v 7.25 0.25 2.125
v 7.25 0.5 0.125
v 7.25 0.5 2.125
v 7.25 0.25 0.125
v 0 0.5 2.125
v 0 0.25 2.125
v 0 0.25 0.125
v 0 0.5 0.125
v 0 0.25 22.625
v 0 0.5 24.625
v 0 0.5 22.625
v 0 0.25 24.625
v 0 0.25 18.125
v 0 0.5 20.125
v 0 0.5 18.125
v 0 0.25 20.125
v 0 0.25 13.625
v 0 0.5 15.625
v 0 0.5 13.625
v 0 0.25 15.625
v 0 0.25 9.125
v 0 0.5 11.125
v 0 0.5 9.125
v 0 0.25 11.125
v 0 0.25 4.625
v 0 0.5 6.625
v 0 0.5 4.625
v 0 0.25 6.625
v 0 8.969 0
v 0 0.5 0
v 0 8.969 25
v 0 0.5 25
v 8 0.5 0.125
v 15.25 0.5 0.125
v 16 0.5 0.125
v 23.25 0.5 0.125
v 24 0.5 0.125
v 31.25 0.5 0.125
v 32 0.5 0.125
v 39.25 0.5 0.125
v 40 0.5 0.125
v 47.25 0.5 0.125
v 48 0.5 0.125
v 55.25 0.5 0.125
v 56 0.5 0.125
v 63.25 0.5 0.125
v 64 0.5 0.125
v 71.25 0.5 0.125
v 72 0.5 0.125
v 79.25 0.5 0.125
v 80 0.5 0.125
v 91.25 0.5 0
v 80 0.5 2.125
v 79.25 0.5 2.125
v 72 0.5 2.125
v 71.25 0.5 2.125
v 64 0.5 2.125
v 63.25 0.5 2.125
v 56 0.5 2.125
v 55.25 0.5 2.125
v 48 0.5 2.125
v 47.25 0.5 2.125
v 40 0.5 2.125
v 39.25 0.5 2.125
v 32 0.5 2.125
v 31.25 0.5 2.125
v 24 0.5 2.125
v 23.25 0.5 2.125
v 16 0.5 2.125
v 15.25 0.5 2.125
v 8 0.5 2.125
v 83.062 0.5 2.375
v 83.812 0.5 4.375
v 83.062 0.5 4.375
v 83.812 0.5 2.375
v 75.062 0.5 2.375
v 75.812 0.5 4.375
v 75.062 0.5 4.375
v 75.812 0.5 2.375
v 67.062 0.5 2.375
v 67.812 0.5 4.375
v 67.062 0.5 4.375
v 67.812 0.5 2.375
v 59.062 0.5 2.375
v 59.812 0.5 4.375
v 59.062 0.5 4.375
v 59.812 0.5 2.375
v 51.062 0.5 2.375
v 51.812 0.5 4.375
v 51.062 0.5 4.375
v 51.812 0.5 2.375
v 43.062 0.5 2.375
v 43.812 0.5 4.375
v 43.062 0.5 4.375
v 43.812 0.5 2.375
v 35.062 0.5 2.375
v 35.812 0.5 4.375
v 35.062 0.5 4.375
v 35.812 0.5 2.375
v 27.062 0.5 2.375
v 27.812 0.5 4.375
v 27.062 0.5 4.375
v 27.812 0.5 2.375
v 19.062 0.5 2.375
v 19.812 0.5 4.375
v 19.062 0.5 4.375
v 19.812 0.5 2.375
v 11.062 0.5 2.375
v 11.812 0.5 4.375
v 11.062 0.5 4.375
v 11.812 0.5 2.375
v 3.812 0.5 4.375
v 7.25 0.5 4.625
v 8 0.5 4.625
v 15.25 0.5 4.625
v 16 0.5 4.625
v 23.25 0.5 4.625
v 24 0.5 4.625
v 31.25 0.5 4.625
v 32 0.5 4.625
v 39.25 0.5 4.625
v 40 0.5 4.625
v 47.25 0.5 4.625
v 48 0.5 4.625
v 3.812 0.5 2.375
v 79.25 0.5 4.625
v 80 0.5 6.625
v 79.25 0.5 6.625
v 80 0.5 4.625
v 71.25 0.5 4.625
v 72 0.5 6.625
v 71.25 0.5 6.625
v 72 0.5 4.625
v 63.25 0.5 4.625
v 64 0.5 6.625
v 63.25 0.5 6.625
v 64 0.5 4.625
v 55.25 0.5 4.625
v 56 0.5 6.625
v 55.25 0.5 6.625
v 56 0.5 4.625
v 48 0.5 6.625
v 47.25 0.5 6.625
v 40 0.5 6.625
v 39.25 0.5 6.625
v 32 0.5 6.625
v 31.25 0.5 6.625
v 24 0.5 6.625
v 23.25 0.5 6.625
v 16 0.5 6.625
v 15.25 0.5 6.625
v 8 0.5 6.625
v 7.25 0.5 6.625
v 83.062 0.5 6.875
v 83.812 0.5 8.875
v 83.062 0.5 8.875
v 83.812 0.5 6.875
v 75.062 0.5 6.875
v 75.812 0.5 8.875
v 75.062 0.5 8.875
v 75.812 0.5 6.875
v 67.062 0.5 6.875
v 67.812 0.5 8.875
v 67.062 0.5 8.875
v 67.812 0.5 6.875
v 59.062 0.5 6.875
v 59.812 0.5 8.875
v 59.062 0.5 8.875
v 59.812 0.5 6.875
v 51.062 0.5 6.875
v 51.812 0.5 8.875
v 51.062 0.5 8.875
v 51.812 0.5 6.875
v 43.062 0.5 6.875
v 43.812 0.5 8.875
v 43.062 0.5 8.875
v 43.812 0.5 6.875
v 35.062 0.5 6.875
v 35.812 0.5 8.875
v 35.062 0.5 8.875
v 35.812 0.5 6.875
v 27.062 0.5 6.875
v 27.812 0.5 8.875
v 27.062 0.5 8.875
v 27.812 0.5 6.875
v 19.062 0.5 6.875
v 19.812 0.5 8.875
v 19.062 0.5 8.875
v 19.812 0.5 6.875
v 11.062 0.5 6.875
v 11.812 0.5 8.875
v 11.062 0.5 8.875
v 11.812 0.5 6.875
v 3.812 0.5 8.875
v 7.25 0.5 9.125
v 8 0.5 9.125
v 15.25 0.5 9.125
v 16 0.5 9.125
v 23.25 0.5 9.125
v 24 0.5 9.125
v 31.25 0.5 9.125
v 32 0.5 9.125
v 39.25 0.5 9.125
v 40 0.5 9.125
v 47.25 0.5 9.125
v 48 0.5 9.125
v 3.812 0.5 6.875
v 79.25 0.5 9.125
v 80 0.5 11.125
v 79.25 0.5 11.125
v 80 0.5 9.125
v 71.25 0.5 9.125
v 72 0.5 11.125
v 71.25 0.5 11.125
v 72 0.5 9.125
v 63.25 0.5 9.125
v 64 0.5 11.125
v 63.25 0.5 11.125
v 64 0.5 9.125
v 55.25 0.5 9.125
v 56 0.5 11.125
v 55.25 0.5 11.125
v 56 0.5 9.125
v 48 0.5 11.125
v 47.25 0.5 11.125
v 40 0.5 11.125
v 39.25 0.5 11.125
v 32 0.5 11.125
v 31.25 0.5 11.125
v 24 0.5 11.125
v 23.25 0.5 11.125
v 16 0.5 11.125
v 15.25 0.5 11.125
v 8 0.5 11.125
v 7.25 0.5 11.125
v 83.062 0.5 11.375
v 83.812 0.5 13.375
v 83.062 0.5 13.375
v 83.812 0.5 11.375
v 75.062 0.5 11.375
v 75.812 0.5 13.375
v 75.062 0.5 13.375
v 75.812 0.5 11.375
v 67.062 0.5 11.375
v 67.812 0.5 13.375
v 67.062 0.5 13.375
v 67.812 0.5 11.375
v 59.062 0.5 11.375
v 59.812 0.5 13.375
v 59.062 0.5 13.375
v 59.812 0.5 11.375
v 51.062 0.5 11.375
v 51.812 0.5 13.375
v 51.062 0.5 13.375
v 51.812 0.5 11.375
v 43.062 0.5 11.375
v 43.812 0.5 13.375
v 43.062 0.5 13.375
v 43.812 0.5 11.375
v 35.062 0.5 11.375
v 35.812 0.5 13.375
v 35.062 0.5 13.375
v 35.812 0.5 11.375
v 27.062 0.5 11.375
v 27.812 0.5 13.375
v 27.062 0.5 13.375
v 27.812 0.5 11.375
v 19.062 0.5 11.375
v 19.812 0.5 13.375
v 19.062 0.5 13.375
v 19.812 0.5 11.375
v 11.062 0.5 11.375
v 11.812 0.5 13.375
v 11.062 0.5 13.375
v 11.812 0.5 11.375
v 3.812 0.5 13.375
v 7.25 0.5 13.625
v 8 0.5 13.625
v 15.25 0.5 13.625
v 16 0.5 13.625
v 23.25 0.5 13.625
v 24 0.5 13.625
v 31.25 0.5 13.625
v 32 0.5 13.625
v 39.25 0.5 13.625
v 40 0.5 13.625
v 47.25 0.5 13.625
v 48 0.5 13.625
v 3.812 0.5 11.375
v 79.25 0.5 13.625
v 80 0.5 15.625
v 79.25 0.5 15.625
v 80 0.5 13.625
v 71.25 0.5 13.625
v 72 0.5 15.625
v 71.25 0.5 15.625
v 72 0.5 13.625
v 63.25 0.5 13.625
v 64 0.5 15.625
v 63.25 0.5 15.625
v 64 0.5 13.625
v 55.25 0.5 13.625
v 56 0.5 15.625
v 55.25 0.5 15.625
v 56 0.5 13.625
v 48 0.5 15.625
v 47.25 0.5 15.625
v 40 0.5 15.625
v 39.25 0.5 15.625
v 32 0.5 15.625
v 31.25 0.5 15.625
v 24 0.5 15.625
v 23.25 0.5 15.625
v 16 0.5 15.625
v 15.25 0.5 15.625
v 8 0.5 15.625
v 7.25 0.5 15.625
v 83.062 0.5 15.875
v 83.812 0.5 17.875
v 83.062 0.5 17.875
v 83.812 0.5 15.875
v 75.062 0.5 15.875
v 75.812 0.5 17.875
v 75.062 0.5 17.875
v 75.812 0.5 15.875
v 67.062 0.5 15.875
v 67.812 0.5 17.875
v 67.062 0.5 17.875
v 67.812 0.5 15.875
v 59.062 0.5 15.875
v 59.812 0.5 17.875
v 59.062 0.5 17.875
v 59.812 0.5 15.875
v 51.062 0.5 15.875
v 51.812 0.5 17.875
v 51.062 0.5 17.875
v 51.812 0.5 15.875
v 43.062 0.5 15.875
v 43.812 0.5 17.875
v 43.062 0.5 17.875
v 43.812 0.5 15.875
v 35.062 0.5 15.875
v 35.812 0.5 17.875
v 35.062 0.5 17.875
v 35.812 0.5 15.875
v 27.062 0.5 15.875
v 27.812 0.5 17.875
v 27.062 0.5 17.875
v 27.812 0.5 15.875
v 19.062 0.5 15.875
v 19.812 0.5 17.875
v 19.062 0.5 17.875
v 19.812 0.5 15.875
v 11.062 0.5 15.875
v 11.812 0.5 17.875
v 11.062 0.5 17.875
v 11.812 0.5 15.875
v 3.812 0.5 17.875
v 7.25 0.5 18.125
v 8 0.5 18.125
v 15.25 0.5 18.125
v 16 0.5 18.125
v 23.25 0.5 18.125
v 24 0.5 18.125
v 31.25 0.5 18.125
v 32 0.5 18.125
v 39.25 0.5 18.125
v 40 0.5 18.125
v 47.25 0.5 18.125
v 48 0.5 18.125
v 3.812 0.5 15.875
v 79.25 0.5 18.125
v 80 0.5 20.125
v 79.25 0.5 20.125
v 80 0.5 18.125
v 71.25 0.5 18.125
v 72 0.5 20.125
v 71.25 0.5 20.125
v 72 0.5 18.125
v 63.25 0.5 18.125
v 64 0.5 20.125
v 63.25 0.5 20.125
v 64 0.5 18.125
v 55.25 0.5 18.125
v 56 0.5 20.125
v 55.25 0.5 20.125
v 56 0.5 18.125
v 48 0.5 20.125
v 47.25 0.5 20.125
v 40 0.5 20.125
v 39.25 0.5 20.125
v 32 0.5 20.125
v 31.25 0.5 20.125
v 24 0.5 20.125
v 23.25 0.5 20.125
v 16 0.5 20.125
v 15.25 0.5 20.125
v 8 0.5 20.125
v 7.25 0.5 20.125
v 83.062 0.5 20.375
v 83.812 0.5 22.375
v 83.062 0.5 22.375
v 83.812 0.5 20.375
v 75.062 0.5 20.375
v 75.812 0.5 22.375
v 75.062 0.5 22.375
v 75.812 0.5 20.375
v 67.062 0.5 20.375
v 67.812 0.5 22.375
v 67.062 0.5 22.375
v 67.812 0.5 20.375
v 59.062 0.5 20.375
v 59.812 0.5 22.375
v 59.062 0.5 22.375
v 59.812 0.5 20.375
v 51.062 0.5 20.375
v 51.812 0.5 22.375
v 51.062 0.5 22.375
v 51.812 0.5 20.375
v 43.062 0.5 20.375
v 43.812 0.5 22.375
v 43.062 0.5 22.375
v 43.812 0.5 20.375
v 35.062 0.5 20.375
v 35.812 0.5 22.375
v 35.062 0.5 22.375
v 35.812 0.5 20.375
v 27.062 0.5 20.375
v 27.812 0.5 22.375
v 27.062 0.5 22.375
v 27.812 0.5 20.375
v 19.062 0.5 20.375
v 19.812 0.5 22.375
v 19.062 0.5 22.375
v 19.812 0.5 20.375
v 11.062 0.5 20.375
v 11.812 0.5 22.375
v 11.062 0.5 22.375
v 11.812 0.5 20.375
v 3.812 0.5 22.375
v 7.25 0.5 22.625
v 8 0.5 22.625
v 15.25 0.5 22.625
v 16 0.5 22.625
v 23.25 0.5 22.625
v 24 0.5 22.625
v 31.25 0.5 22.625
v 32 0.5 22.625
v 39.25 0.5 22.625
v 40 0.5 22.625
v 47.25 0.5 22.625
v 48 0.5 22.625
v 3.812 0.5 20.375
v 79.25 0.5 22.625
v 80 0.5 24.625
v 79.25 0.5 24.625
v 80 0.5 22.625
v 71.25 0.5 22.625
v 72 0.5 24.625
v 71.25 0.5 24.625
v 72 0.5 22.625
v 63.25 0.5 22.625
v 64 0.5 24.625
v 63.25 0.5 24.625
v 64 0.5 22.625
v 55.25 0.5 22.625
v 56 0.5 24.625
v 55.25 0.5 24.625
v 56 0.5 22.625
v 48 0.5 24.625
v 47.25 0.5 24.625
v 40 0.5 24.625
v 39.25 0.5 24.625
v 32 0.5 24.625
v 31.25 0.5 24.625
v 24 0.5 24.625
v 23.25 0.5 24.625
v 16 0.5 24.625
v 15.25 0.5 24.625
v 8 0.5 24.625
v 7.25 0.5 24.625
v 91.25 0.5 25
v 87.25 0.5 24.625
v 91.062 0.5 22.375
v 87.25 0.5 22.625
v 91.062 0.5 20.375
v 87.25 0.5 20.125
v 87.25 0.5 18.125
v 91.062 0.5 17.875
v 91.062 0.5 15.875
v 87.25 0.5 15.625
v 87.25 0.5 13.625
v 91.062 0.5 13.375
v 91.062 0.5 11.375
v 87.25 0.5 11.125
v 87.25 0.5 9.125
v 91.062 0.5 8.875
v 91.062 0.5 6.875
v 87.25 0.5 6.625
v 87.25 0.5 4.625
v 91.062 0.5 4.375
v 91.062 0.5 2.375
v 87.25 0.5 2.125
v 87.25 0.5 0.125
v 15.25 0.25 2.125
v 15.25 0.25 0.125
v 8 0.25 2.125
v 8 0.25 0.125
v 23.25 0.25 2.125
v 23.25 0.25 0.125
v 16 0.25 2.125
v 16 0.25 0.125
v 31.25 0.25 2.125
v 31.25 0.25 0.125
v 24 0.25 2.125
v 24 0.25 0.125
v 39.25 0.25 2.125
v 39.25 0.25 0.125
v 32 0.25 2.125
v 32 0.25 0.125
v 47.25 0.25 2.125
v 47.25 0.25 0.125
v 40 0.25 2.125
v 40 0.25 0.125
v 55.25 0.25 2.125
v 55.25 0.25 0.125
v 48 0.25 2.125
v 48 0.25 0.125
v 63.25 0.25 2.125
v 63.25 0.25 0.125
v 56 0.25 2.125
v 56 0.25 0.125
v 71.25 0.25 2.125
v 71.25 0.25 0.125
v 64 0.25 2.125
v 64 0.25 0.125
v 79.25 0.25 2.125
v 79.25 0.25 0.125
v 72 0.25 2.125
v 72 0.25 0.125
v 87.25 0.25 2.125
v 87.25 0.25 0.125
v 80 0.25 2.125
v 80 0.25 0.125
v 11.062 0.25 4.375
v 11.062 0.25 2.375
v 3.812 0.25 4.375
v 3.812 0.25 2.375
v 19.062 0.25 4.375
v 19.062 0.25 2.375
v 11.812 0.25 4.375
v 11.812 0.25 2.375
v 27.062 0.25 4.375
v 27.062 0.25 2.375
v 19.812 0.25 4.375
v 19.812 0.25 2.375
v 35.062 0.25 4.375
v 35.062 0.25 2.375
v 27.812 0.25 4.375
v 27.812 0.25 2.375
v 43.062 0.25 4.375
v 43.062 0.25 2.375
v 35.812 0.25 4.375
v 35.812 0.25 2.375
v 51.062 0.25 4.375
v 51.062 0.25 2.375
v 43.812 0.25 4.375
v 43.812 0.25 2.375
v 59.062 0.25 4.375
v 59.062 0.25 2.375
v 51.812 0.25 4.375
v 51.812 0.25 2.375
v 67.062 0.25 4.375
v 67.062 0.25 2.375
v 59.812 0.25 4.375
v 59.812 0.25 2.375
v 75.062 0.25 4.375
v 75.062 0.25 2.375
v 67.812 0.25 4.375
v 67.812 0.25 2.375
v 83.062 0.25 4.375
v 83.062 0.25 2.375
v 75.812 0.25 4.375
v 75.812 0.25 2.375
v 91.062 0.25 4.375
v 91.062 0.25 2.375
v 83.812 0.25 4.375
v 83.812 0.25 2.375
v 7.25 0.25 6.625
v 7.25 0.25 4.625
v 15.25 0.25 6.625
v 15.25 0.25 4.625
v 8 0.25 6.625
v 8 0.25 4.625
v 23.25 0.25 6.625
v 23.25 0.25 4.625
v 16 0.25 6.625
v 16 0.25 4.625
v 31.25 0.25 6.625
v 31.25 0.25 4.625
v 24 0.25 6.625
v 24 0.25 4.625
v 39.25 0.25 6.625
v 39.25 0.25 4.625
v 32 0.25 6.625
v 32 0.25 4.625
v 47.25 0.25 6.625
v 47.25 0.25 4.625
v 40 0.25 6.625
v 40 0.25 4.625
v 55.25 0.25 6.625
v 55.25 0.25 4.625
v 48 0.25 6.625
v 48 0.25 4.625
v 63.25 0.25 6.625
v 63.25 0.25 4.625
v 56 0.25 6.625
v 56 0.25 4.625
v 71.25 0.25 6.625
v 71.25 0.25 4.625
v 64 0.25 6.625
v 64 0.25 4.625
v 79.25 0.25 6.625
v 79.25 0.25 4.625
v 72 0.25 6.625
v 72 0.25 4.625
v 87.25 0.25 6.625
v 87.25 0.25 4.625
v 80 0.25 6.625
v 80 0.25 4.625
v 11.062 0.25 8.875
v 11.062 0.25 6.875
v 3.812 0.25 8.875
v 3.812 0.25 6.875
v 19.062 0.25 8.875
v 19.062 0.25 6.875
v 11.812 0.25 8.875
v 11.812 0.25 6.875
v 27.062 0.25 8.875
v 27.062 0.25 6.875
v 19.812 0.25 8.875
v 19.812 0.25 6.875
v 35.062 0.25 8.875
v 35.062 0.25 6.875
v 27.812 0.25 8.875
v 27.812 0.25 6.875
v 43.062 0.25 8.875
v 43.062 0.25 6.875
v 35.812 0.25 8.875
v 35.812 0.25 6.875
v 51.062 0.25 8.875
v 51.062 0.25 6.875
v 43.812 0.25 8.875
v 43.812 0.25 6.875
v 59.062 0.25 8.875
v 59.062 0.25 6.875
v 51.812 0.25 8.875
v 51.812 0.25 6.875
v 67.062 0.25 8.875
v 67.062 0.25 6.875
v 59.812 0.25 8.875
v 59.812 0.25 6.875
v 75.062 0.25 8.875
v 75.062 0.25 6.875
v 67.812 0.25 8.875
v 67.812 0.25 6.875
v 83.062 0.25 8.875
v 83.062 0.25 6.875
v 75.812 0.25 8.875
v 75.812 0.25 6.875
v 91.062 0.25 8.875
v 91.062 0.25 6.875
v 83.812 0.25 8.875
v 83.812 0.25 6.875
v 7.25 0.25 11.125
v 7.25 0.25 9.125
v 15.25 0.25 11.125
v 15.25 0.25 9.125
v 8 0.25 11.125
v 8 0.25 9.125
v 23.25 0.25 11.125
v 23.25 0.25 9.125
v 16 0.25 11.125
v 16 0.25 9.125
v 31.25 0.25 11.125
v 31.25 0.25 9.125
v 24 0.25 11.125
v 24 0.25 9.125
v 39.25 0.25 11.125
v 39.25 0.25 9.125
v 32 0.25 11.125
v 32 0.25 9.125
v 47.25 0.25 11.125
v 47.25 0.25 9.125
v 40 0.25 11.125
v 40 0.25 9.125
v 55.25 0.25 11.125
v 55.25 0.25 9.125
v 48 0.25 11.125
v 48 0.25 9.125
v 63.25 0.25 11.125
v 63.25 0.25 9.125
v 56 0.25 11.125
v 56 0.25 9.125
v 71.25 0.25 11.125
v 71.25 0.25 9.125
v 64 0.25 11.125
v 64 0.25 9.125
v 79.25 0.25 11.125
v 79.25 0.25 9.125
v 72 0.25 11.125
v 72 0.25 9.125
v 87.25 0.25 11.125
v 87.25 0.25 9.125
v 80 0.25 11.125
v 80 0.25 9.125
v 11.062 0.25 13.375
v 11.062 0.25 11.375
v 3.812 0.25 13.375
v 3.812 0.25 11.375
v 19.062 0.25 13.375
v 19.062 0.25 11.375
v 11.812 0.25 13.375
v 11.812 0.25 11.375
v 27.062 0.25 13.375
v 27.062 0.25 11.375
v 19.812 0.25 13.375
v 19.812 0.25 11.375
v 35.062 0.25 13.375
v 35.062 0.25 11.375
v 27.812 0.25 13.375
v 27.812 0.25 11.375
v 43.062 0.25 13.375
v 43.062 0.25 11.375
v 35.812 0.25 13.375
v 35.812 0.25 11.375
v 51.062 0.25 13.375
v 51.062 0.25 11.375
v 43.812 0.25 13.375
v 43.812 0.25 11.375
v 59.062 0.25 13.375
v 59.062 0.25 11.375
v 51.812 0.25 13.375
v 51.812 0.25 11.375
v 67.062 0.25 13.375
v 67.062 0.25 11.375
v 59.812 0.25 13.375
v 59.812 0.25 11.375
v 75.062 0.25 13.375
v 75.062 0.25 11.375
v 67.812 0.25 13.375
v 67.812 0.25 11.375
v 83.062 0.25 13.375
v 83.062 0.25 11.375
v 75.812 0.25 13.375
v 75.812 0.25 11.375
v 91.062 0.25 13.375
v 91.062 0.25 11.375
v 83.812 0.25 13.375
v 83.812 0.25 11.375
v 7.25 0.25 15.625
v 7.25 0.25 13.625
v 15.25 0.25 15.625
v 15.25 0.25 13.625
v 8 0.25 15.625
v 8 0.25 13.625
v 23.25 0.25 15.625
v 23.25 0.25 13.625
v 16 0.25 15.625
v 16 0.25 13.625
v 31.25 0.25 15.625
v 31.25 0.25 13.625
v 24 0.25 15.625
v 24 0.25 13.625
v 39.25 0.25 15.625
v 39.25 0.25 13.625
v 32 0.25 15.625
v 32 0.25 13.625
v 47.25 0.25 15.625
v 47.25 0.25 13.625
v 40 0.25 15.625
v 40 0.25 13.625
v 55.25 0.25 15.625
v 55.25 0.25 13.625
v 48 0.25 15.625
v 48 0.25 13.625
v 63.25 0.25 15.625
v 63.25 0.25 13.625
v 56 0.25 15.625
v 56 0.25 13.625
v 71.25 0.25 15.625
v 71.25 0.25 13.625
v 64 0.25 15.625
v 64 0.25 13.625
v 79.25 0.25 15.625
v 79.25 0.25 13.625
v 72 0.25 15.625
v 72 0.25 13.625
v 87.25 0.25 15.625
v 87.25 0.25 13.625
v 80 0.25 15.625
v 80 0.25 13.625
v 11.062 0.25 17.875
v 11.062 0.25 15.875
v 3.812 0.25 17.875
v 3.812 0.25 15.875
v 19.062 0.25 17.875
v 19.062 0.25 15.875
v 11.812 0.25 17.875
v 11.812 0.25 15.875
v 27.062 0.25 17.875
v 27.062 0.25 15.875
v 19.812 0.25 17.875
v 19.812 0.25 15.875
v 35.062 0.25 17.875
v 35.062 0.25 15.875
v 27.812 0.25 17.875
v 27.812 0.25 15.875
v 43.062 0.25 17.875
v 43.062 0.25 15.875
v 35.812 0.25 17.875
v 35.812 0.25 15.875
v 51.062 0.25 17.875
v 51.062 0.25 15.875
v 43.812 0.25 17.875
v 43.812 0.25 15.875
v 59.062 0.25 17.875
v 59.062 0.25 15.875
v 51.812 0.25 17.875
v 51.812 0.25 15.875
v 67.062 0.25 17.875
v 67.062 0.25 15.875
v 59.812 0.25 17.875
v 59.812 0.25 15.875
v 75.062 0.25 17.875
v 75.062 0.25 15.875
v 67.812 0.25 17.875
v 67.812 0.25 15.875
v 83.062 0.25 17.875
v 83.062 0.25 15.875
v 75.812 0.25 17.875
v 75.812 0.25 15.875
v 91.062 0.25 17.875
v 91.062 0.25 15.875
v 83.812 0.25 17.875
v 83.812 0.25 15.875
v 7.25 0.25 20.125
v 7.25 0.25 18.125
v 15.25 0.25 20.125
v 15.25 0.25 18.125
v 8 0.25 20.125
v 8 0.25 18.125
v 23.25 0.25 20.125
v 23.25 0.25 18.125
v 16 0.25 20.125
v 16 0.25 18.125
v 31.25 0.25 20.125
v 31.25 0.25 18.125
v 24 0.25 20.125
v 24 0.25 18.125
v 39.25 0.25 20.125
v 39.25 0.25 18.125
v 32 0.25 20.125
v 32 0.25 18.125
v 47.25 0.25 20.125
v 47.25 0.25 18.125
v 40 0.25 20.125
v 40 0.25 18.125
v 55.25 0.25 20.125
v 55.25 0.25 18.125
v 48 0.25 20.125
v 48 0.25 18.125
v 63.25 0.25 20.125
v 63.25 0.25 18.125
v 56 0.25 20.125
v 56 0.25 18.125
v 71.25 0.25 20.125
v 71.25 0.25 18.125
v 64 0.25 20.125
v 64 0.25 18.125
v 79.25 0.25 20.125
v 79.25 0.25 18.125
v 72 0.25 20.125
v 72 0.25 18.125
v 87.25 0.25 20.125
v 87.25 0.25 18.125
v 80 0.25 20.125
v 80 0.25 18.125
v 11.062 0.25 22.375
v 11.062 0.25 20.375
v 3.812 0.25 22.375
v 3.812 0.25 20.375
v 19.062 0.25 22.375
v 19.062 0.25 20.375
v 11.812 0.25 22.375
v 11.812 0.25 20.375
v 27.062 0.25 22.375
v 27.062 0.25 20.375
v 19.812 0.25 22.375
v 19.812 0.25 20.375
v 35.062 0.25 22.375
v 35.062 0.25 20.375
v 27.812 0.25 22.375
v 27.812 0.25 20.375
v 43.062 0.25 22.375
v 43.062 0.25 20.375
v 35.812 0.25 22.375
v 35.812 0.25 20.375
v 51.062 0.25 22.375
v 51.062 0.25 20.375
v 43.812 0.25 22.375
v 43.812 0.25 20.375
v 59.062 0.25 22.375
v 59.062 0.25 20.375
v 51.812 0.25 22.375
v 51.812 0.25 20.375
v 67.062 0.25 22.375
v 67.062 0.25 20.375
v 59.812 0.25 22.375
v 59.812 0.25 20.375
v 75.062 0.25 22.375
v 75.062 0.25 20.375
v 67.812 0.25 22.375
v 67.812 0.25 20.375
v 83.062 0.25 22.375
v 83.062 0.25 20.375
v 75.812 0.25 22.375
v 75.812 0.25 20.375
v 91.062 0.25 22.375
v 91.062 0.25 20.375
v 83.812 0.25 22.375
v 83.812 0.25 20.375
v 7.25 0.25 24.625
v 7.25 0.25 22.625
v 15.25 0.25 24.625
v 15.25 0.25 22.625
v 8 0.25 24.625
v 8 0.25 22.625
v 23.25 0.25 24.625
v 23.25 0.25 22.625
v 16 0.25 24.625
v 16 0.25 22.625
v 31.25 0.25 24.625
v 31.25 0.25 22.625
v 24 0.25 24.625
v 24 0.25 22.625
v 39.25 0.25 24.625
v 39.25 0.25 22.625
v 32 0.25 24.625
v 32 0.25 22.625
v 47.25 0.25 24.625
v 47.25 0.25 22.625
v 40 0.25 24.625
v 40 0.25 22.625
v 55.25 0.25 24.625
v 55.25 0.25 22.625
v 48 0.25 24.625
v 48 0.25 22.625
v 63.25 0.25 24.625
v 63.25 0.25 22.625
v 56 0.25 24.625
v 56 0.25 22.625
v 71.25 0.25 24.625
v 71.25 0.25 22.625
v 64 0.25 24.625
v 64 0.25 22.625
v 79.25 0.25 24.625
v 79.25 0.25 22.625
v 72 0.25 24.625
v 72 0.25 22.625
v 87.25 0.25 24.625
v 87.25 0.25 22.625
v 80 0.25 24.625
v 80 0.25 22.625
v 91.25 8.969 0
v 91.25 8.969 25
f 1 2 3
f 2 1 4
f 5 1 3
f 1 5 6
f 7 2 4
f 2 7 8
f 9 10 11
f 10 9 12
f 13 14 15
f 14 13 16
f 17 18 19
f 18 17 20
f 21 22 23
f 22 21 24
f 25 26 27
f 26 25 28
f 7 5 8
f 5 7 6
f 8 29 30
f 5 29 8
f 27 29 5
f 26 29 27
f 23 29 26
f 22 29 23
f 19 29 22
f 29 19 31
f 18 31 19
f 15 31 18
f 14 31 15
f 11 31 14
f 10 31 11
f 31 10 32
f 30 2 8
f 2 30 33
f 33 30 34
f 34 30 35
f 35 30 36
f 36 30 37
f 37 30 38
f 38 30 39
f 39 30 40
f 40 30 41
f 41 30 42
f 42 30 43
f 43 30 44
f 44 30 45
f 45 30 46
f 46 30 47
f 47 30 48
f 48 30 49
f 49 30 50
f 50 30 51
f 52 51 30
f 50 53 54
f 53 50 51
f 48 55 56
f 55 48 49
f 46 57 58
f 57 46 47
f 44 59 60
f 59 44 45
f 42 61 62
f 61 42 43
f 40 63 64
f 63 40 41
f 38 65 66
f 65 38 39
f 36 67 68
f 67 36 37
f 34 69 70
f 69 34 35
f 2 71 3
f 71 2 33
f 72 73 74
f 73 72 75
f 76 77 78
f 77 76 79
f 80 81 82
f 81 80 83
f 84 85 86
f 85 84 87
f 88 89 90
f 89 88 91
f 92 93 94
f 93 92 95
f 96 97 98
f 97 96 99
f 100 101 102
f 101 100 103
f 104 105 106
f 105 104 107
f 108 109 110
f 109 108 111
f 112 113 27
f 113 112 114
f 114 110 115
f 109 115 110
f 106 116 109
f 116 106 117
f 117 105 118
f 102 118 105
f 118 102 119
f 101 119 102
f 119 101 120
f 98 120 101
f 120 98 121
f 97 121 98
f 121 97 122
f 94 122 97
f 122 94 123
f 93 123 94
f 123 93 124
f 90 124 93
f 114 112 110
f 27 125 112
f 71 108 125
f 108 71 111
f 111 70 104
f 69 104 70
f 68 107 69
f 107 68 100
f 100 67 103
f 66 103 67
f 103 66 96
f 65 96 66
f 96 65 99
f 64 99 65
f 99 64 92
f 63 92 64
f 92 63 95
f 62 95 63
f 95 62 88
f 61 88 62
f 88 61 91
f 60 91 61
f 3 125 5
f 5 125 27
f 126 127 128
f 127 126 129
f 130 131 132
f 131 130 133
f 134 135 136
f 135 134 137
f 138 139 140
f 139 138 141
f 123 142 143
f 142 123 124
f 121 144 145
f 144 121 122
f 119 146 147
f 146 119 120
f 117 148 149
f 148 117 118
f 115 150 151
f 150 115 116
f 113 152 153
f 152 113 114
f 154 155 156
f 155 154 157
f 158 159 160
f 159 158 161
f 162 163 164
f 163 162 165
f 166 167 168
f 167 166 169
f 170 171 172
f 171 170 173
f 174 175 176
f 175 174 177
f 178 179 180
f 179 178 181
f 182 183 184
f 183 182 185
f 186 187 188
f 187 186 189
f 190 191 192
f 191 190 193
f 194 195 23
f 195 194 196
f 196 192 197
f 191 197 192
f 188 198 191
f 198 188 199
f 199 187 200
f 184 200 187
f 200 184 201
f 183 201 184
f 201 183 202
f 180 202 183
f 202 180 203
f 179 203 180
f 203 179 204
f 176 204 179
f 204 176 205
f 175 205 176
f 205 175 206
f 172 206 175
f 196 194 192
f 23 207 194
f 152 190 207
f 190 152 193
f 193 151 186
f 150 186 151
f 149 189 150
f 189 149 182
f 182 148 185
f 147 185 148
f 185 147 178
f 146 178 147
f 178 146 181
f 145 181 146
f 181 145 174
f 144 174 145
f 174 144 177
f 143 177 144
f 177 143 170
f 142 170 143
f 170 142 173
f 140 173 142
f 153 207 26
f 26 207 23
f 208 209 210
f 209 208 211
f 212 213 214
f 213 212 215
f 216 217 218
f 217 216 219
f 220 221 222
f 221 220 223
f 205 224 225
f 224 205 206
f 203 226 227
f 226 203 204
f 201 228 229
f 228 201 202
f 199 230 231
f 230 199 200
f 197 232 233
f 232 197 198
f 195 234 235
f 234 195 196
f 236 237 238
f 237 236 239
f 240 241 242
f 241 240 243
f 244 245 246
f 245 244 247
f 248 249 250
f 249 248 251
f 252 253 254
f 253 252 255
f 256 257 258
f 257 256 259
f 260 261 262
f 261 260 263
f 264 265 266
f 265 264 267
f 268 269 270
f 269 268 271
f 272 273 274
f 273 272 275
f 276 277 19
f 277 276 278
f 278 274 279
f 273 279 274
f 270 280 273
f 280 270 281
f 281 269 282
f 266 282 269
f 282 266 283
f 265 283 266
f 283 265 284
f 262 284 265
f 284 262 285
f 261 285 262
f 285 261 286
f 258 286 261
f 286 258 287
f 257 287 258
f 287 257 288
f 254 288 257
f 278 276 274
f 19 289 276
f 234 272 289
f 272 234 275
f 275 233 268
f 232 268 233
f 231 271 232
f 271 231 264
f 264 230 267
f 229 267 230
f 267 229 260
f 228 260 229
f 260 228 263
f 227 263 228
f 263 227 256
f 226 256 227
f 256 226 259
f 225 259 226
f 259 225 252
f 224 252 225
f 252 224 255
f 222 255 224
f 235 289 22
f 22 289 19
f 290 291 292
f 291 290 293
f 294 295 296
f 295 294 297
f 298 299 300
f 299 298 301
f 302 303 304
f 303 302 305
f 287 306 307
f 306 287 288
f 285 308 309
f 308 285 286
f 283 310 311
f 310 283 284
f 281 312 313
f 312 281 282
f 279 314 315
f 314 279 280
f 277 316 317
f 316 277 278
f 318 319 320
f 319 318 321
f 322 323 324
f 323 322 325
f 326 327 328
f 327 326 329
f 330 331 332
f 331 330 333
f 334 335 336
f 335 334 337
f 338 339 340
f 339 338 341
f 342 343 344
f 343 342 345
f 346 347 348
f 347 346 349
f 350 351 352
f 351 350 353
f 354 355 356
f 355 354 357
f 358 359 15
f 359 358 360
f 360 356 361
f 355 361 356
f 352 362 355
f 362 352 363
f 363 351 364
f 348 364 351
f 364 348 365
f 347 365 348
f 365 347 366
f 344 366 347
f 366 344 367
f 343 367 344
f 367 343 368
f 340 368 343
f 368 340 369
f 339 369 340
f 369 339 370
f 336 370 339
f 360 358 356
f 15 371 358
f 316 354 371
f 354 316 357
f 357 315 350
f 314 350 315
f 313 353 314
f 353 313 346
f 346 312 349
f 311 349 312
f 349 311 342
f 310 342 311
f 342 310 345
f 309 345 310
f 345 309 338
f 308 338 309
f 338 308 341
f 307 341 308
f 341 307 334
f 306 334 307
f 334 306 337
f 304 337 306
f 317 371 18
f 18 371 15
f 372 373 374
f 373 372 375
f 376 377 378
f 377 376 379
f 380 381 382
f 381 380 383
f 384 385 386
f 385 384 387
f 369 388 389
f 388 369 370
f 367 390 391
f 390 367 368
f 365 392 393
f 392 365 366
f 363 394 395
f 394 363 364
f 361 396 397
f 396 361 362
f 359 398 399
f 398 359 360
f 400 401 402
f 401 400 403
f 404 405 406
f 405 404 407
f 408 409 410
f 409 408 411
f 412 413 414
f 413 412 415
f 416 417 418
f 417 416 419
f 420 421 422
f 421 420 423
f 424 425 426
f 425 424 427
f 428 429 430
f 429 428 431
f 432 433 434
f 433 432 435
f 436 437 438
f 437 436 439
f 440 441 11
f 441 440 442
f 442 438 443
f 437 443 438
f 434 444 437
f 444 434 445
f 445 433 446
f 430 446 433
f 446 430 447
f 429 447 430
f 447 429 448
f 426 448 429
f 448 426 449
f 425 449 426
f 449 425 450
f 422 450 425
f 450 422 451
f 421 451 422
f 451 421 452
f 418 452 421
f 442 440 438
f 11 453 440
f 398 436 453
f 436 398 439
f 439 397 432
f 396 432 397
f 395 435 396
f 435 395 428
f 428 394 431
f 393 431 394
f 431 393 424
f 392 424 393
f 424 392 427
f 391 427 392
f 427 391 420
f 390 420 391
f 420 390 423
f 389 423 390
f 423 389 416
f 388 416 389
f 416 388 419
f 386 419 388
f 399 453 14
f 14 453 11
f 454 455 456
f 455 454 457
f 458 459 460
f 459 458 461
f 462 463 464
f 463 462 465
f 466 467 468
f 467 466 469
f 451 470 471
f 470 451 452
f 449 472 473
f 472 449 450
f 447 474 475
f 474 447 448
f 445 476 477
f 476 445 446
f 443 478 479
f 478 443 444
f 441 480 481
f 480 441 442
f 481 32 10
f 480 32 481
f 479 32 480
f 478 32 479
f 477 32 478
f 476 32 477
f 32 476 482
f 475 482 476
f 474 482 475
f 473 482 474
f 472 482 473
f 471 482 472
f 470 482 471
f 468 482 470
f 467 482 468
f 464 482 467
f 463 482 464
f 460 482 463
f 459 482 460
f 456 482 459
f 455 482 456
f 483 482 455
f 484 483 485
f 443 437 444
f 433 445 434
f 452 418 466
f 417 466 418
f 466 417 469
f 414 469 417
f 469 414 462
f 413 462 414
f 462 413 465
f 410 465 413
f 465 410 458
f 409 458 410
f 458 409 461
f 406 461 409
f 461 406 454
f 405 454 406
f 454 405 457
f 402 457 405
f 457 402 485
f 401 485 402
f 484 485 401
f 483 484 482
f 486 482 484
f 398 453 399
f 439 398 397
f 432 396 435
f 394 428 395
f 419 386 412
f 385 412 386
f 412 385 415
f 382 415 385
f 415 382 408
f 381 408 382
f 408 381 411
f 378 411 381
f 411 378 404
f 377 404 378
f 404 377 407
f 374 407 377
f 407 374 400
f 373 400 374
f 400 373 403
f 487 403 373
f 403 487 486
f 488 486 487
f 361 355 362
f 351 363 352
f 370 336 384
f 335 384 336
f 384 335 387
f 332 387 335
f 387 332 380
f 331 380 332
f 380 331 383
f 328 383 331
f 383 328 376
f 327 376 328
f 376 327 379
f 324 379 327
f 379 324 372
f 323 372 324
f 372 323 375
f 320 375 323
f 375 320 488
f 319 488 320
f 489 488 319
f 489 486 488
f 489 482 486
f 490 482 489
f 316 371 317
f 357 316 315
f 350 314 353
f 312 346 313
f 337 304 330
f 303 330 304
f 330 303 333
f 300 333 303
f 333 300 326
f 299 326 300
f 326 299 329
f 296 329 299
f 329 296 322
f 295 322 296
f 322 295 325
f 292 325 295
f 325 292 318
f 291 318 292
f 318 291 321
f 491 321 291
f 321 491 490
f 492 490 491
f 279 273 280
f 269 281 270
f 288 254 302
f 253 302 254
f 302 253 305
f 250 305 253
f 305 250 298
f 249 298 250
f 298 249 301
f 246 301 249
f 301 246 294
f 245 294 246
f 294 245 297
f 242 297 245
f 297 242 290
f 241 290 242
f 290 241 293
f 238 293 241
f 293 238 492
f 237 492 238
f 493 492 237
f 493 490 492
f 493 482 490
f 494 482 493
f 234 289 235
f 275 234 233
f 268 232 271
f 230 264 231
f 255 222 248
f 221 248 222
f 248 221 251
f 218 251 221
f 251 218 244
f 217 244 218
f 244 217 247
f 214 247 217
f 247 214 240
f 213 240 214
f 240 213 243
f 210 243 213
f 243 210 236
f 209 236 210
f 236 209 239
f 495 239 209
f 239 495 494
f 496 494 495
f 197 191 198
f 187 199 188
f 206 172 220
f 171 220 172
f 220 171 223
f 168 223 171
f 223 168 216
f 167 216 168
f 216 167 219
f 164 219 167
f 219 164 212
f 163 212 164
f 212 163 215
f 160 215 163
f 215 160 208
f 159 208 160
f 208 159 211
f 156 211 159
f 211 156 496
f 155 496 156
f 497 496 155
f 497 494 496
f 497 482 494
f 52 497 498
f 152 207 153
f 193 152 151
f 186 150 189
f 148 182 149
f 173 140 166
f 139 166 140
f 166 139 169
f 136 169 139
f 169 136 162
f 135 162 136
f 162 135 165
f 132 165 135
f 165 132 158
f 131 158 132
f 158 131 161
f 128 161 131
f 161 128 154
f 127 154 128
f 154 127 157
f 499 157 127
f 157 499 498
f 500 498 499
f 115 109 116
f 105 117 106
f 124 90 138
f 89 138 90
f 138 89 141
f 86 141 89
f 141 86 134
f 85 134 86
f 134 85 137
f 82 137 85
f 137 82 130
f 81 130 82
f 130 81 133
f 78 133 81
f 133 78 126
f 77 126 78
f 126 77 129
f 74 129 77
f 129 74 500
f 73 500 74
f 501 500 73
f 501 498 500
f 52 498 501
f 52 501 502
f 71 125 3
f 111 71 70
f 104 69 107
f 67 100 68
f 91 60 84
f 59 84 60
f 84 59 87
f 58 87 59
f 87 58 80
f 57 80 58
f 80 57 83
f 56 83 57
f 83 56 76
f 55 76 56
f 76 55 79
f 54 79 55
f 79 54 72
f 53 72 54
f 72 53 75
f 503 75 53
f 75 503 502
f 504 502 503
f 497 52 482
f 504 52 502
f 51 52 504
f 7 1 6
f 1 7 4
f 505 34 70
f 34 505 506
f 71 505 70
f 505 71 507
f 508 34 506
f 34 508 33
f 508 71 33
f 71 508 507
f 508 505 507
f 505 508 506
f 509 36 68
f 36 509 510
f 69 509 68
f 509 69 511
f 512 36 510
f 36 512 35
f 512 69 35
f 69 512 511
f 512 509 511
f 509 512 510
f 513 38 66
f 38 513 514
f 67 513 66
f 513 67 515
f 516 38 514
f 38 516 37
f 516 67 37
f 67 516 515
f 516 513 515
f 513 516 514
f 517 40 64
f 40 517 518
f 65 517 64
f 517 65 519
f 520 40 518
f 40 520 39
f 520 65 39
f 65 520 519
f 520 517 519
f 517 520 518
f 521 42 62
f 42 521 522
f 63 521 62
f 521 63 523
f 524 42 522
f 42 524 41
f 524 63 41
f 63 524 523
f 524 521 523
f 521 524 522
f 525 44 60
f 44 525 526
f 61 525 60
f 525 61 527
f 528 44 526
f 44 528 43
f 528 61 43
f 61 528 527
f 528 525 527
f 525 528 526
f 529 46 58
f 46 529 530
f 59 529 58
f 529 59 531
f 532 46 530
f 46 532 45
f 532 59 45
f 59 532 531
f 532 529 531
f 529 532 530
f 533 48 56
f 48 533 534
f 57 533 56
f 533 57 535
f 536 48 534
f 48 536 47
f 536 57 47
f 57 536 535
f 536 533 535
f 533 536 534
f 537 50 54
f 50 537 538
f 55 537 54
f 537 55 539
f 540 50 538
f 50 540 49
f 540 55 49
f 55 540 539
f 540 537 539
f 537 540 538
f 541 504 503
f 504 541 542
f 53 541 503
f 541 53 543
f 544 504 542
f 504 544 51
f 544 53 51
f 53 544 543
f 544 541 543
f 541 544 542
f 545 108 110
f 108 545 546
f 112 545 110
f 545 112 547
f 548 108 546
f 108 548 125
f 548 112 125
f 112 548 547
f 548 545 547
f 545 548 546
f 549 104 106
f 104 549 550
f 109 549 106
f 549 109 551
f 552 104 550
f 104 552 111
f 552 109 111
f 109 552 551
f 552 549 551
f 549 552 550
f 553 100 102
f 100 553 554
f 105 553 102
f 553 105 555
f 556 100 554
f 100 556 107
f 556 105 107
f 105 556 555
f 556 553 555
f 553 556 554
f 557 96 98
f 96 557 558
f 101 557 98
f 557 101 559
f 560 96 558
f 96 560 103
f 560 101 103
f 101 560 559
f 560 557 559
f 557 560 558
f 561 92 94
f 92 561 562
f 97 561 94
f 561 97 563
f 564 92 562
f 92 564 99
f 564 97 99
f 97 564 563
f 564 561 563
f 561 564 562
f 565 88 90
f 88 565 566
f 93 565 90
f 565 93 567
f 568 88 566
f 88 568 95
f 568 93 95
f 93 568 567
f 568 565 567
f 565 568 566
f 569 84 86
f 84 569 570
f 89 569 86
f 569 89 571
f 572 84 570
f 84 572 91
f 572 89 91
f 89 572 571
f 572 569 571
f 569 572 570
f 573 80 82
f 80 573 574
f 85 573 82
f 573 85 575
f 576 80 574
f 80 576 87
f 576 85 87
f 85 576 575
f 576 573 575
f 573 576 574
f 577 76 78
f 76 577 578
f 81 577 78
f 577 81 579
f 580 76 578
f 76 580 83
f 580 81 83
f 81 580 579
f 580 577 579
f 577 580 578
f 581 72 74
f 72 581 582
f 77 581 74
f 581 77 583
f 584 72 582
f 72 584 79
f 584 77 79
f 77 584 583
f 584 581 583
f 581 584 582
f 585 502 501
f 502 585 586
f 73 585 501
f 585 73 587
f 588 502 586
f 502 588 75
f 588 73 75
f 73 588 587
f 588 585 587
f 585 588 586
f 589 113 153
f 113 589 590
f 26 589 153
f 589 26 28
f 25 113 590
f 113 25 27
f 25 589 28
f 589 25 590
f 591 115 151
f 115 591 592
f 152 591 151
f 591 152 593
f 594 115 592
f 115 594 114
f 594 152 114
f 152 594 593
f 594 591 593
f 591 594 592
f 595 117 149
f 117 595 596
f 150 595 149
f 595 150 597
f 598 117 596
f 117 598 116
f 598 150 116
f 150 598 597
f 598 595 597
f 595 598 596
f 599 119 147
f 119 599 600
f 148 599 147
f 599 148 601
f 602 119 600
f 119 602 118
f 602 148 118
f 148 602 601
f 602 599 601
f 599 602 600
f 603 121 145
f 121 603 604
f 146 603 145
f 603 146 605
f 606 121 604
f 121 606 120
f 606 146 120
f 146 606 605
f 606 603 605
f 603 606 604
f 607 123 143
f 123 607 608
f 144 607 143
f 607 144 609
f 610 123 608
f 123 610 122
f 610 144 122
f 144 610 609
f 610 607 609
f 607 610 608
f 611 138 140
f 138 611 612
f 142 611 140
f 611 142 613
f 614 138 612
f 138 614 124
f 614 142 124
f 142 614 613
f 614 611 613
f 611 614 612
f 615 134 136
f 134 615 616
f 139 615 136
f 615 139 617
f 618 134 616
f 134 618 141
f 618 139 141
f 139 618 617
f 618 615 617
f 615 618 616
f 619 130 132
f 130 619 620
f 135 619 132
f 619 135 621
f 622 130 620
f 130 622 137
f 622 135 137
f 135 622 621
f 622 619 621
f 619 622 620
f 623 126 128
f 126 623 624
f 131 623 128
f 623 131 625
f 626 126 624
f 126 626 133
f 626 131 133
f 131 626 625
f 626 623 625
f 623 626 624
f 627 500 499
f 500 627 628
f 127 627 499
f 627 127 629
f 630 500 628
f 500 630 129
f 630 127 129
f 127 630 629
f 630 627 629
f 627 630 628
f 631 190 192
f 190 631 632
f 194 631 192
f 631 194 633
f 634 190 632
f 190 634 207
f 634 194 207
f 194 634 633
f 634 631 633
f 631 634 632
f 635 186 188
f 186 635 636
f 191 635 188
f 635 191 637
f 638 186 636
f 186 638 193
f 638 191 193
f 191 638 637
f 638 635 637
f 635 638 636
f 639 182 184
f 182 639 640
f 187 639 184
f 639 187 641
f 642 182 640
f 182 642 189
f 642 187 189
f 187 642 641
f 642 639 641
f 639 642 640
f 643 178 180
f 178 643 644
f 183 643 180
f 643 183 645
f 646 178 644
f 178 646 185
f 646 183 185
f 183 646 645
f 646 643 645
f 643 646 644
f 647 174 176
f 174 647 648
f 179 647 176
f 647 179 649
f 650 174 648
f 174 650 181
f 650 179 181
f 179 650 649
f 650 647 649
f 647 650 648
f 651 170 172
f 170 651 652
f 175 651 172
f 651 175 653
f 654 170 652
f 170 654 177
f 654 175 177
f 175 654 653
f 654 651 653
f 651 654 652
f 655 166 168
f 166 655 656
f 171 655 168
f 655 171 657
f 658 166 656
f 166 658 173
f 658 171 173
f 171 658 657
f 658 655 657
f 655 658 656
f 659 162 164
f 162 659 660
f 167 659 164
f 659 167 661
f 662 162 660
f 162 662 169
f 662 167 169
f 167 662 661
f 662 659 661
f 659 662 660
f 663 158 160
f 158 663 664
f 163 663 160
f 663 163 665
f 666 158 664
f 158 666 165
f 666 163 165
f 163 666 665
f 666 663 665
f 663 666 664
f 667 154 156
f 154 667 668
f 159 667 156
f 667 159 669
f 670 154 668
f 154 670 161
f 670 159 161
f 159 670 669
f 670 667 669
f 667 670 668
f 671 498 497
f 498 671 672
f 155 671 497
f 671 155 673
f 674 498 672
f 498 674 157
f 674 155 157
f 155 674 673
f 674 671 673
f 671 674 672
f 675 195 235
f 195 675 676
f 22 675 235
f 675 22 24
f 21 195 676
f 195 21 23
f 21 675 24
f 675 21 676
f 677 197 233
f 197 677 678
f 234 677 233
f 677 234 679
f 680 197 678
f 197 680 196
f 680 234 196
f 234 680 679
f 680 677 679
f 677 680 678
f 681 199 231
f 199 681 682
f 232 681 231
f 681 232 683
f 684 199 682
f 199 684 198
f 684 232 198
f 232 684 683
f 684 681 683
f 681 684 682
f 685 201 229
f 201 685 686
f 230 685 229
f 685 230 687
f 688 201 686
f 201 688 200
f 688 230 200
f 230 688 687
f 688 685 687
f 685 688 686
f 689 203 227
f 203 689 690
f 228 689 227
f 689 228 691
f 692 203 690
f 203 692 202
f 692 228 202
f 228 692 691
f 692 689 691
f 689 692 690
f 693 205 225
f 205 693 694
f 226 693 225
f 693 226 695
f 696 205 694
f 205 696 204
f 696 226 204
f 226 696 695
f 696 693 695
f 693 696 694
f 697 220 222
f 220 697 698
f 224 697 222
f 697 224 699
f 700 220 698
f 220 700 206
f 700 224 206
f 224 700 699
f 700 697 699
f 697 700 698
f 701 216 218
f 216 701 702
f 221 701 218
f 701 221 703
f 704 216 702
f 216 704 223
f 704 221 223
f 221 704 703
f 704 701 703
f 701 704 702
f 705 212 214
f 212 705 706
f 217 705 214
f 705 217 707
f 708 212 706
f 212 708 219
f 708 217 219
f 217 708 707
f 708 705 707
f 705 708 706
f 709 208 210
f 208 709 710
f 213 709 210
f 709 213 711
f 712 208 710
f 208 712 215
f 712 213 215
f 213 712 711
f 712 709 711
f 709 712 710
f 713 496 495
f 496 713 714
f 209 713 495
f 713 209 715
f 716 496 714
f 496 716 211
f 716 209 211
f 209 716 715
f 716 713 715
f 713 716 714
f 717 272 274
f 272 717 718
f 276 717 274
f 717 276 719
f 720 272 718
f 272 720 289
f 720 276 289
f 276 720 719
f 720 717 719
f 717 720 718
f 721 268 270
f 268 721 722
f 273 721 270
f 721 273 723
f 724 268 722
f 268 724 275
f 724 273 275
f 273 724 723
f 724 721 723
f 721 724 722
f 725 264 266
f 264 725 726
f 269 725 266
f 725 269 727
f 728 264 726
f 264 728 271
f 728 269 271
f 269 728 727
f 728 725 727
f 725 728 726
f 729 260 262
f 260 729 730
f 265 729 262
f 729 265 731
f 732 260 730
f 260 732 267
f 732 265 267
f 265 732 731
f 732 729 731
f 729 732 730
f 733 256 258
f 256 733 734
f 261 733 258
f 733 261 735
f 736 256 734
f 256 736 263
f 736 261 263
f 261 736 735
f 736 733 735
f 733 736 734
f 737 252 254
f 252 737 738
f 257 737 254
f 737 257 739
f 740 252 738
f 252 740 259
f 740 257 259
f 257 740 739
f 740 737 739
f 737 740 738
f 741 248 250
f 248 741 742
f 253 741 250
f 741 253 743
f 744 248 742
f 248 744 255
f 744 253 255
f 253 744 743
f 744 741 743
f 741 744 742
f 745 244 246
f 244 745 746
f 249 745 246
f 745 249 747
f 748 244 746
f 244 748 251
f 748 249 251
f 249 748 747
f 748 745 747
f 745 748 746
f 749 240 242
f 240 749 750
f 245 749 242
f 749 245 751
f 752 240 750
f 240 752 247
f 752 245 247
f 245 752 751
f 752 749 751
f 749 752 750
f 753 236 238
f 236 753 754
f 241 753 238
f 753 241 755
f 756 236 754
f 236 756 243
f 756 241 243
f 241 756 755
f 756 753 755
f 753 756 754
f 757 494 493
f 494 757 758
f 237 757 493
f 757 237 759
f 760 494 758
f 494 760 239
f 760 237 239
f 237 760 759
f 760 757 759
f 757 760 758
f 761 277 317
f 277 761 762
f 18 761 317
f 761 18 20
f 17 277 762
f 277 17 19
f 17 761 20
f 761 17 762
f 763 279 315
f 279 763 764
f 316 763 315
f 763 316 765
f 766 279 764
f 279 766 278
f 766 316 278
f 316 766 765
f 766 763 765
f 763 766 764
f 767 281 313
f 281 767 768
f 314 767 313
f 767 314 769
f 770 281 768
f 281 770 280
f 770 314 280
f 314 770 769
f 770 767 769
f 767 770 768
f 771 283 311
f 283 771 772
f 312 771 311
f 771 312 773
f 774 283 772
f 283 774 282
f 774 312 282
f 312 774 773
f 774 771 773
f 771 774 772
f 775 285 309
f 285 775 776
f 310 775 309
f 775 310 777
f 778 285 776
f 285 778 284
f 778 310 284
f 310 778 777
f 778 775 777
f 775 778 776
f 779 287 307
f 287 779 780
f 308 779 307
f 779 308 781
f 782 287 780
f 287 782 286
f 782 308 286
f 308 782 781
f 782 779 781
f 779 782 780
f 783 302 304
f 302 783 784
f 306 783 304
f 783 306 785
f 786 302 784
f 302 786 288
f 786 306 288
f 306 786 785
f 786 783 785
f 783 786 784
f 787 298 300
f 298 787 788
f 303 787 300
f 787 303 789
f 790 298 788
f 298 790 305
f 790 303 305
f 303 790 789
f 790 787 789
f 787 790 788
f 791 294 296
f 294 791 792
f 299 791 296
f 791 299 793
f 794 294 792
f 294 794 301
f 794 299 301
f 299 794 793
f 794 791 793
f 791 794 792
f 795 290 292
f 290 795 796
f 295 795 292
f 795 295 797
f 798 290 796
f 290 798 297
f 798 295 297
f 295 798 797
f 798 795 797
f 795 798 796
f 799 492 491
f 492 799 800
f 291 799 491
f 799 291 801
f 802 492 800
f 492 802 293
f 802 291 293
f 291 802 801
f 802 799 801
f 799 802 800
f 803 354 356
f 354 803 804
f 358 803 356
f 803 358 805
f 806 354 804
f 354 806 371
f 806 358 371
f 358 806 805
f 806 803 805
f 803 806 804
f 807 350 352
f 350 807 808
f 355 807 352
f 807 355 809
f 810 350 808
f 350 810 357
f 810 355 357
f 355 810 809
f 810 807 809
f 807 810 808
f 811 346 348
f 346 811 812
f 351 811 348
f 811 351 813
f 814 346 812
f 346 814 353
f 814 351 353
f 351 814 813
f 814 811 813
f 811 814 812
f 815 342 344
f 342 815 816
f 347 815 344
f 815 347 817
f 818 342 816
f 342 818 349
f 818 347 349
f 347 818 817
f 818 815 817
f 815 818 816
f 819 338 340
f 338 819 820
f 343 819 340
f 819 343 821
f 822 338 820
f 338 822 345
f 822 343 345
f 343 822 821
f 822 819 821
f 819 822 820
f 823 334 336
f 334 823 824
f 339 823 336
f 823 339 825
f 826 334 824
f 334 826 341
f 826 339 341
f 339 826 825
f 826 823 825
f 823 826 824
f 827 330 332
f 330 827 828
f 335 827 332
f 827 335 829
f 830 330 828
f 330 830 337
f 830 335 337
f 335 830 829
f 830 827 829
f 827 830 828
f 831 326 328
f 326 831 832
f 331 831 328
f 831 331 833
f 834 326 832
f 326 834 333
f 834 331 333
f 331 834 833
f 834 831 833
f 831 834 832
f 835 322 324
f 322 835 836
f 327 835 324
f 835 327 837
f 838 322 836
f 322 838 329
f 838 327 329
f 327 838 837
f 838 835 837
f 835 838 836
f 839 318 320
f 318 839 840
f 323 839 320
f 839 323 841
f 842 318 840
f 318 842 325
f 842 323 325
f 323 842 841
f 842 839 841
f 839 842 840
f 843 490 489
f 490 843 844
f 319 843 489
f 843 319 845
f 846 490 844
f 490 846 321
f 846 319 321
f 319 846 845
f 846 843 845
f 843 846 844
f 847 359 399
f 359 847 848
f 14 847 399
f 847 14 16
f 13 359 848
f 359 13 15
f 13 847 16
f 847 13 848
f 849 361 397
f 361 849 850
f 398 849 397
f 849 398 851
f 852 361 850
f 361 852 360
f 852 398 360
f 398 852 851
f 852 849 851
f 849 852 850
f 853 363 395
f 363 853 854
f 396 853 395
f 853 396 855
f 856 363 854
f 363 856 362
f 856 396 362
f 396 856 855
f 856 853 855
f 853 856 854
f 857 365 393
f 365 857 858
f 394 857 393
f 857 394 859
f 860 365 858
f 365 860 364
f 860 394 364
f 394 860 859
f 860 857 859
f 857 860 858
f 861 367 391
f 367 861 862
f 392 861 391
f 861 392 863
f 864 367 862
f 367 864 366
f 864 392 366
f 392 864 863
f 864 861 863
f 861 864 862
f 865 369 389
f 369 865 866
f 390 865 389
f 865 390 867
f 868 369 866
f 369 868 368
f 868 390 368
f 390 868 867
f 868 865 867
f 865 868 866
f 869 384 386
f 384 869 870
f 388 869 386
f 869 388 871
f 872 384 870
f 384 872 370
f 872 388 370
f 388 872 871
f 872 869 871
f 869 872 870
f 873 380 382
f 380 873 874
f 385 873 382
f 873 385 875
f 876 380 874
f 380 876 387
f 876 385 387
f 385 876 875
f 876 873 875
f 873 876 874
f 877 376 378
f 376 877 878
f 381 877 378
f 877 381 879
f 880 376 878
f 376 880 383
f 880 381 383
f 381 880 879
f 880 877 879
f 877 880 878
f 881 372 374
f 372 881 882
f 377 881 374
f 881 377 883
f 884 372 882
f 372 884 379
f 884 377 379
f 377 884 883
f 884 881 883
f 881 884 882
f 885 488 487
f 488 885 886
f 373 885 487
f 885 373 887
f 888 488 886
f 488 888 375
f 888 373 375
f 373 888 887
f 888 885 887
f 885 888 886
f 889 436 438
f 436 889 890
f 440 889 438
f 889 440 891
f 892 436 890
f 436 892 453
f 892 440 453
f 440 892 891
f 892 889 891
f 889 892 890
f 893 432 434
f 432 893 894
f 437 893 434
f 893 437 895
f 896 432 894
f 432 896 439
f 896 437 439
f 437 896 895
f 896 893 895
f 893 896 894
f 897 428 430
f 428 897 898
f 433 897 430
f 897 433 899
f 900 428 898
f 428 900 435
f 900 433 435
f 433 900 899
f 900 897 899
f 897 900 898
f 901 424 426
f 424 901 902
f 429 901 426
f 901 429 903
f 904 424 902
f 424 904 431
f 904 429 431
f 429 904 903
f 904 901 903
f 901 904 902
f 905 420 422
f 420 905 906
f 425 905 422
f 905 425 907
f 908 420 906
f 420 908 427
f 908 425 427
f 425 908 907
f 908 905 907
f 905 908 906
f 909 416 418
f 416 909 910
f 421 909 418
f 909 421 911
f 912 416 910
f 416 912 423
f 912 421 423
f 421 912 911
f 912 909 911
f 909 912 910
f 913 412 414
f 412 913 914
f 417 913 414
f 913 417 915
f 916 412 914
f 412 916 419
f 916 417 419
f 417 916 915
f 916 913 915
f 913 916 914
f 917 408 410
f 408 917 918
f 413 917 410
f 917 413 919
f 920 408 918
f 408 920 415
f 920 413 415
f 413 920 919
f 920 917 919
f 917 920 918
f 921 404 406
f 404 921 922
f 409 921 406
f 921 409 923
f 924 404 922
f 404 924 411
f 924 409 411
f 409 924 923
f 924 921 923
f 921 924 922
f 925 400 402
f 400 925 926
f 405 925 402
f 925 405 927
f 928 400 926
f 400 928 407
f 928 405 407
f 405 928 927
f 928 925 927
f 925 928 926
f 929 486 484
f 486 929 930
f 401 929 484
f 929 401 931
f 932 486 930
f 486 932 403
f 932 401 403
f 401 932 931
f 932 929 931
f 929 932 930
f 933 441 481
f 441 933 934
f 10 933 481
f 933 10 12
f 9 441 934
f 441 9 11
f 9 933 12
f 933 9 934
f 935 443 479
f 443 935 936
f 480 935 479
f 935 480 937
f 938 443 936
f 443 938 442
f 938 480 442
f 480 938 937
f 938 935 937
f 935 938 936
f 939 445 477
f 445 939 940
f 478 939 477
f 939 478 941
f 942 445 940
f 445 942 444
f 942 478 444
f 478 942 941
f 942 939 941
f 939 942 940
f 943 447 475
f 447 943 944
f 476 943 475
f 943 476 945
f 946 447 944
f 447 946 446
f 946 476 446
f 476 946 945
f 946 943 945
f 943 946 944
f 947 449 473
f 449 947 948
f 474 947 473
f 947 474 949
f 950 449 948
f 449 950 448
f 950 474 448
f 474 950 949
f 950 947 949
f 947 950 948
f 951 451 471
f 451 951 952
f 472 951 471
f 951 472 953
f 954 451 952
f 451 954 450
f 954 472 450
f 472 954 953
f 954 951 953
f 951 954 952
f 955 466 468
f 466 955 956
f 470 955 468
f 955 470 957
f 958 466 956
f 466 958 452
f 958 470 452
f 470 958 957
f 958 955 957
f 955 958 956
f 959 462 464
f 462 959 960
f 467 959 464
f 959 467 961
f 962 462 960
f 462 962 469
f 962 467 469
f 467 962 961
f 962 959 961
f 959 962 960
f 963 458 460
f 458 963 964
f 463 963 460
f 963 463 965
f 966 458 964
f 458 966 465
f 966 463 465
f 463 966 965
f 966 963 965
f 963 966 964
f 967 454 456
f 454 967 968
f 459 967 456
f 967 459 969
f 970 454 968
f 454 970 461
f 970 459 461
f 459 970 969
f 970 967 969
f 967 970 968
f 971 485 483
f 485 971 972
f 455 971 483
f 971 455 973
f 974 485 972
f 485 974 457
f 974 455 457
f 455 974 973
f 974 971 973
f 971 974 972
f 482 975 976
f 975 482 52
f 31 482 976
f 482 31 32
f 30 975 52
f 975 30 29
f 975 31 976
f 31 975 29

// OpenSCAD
brick_x = 7.625;
brick_y = 3.625;
brick_z = 2.25;

spacing_x = .375;
spacing_y = .25;
recess = .250;

module brick_wall(width,
                  height,
                  thickness = (brick_y + recess),
                  parity = 0)
{
    union()
    {
        translate([ 0, 2 * recess, 0 ]) cube([
            (brick_x + spacing_x) * (width + 1.5 ) - 2*spacing_x,
            (thickness * brick_z - recess),
            (brick_z + spacing_y) *
            height
        ]);
        for (i = [0:height]) {
            for (j = [0:width]) {
                translate([
                    j * (brick_x + spacing_x) +
                        (i % 2 + parity) * .5 * brick_x,
                    recess,
                    i * brick_z + spacing_y / 2
                ])
                    cube([
                        brick_x - spacing_x,
                        recess,
                        brick_z -
                        spacing_y
                    ]);
            }
        }
    }
}

brick_wall(10, 10);
